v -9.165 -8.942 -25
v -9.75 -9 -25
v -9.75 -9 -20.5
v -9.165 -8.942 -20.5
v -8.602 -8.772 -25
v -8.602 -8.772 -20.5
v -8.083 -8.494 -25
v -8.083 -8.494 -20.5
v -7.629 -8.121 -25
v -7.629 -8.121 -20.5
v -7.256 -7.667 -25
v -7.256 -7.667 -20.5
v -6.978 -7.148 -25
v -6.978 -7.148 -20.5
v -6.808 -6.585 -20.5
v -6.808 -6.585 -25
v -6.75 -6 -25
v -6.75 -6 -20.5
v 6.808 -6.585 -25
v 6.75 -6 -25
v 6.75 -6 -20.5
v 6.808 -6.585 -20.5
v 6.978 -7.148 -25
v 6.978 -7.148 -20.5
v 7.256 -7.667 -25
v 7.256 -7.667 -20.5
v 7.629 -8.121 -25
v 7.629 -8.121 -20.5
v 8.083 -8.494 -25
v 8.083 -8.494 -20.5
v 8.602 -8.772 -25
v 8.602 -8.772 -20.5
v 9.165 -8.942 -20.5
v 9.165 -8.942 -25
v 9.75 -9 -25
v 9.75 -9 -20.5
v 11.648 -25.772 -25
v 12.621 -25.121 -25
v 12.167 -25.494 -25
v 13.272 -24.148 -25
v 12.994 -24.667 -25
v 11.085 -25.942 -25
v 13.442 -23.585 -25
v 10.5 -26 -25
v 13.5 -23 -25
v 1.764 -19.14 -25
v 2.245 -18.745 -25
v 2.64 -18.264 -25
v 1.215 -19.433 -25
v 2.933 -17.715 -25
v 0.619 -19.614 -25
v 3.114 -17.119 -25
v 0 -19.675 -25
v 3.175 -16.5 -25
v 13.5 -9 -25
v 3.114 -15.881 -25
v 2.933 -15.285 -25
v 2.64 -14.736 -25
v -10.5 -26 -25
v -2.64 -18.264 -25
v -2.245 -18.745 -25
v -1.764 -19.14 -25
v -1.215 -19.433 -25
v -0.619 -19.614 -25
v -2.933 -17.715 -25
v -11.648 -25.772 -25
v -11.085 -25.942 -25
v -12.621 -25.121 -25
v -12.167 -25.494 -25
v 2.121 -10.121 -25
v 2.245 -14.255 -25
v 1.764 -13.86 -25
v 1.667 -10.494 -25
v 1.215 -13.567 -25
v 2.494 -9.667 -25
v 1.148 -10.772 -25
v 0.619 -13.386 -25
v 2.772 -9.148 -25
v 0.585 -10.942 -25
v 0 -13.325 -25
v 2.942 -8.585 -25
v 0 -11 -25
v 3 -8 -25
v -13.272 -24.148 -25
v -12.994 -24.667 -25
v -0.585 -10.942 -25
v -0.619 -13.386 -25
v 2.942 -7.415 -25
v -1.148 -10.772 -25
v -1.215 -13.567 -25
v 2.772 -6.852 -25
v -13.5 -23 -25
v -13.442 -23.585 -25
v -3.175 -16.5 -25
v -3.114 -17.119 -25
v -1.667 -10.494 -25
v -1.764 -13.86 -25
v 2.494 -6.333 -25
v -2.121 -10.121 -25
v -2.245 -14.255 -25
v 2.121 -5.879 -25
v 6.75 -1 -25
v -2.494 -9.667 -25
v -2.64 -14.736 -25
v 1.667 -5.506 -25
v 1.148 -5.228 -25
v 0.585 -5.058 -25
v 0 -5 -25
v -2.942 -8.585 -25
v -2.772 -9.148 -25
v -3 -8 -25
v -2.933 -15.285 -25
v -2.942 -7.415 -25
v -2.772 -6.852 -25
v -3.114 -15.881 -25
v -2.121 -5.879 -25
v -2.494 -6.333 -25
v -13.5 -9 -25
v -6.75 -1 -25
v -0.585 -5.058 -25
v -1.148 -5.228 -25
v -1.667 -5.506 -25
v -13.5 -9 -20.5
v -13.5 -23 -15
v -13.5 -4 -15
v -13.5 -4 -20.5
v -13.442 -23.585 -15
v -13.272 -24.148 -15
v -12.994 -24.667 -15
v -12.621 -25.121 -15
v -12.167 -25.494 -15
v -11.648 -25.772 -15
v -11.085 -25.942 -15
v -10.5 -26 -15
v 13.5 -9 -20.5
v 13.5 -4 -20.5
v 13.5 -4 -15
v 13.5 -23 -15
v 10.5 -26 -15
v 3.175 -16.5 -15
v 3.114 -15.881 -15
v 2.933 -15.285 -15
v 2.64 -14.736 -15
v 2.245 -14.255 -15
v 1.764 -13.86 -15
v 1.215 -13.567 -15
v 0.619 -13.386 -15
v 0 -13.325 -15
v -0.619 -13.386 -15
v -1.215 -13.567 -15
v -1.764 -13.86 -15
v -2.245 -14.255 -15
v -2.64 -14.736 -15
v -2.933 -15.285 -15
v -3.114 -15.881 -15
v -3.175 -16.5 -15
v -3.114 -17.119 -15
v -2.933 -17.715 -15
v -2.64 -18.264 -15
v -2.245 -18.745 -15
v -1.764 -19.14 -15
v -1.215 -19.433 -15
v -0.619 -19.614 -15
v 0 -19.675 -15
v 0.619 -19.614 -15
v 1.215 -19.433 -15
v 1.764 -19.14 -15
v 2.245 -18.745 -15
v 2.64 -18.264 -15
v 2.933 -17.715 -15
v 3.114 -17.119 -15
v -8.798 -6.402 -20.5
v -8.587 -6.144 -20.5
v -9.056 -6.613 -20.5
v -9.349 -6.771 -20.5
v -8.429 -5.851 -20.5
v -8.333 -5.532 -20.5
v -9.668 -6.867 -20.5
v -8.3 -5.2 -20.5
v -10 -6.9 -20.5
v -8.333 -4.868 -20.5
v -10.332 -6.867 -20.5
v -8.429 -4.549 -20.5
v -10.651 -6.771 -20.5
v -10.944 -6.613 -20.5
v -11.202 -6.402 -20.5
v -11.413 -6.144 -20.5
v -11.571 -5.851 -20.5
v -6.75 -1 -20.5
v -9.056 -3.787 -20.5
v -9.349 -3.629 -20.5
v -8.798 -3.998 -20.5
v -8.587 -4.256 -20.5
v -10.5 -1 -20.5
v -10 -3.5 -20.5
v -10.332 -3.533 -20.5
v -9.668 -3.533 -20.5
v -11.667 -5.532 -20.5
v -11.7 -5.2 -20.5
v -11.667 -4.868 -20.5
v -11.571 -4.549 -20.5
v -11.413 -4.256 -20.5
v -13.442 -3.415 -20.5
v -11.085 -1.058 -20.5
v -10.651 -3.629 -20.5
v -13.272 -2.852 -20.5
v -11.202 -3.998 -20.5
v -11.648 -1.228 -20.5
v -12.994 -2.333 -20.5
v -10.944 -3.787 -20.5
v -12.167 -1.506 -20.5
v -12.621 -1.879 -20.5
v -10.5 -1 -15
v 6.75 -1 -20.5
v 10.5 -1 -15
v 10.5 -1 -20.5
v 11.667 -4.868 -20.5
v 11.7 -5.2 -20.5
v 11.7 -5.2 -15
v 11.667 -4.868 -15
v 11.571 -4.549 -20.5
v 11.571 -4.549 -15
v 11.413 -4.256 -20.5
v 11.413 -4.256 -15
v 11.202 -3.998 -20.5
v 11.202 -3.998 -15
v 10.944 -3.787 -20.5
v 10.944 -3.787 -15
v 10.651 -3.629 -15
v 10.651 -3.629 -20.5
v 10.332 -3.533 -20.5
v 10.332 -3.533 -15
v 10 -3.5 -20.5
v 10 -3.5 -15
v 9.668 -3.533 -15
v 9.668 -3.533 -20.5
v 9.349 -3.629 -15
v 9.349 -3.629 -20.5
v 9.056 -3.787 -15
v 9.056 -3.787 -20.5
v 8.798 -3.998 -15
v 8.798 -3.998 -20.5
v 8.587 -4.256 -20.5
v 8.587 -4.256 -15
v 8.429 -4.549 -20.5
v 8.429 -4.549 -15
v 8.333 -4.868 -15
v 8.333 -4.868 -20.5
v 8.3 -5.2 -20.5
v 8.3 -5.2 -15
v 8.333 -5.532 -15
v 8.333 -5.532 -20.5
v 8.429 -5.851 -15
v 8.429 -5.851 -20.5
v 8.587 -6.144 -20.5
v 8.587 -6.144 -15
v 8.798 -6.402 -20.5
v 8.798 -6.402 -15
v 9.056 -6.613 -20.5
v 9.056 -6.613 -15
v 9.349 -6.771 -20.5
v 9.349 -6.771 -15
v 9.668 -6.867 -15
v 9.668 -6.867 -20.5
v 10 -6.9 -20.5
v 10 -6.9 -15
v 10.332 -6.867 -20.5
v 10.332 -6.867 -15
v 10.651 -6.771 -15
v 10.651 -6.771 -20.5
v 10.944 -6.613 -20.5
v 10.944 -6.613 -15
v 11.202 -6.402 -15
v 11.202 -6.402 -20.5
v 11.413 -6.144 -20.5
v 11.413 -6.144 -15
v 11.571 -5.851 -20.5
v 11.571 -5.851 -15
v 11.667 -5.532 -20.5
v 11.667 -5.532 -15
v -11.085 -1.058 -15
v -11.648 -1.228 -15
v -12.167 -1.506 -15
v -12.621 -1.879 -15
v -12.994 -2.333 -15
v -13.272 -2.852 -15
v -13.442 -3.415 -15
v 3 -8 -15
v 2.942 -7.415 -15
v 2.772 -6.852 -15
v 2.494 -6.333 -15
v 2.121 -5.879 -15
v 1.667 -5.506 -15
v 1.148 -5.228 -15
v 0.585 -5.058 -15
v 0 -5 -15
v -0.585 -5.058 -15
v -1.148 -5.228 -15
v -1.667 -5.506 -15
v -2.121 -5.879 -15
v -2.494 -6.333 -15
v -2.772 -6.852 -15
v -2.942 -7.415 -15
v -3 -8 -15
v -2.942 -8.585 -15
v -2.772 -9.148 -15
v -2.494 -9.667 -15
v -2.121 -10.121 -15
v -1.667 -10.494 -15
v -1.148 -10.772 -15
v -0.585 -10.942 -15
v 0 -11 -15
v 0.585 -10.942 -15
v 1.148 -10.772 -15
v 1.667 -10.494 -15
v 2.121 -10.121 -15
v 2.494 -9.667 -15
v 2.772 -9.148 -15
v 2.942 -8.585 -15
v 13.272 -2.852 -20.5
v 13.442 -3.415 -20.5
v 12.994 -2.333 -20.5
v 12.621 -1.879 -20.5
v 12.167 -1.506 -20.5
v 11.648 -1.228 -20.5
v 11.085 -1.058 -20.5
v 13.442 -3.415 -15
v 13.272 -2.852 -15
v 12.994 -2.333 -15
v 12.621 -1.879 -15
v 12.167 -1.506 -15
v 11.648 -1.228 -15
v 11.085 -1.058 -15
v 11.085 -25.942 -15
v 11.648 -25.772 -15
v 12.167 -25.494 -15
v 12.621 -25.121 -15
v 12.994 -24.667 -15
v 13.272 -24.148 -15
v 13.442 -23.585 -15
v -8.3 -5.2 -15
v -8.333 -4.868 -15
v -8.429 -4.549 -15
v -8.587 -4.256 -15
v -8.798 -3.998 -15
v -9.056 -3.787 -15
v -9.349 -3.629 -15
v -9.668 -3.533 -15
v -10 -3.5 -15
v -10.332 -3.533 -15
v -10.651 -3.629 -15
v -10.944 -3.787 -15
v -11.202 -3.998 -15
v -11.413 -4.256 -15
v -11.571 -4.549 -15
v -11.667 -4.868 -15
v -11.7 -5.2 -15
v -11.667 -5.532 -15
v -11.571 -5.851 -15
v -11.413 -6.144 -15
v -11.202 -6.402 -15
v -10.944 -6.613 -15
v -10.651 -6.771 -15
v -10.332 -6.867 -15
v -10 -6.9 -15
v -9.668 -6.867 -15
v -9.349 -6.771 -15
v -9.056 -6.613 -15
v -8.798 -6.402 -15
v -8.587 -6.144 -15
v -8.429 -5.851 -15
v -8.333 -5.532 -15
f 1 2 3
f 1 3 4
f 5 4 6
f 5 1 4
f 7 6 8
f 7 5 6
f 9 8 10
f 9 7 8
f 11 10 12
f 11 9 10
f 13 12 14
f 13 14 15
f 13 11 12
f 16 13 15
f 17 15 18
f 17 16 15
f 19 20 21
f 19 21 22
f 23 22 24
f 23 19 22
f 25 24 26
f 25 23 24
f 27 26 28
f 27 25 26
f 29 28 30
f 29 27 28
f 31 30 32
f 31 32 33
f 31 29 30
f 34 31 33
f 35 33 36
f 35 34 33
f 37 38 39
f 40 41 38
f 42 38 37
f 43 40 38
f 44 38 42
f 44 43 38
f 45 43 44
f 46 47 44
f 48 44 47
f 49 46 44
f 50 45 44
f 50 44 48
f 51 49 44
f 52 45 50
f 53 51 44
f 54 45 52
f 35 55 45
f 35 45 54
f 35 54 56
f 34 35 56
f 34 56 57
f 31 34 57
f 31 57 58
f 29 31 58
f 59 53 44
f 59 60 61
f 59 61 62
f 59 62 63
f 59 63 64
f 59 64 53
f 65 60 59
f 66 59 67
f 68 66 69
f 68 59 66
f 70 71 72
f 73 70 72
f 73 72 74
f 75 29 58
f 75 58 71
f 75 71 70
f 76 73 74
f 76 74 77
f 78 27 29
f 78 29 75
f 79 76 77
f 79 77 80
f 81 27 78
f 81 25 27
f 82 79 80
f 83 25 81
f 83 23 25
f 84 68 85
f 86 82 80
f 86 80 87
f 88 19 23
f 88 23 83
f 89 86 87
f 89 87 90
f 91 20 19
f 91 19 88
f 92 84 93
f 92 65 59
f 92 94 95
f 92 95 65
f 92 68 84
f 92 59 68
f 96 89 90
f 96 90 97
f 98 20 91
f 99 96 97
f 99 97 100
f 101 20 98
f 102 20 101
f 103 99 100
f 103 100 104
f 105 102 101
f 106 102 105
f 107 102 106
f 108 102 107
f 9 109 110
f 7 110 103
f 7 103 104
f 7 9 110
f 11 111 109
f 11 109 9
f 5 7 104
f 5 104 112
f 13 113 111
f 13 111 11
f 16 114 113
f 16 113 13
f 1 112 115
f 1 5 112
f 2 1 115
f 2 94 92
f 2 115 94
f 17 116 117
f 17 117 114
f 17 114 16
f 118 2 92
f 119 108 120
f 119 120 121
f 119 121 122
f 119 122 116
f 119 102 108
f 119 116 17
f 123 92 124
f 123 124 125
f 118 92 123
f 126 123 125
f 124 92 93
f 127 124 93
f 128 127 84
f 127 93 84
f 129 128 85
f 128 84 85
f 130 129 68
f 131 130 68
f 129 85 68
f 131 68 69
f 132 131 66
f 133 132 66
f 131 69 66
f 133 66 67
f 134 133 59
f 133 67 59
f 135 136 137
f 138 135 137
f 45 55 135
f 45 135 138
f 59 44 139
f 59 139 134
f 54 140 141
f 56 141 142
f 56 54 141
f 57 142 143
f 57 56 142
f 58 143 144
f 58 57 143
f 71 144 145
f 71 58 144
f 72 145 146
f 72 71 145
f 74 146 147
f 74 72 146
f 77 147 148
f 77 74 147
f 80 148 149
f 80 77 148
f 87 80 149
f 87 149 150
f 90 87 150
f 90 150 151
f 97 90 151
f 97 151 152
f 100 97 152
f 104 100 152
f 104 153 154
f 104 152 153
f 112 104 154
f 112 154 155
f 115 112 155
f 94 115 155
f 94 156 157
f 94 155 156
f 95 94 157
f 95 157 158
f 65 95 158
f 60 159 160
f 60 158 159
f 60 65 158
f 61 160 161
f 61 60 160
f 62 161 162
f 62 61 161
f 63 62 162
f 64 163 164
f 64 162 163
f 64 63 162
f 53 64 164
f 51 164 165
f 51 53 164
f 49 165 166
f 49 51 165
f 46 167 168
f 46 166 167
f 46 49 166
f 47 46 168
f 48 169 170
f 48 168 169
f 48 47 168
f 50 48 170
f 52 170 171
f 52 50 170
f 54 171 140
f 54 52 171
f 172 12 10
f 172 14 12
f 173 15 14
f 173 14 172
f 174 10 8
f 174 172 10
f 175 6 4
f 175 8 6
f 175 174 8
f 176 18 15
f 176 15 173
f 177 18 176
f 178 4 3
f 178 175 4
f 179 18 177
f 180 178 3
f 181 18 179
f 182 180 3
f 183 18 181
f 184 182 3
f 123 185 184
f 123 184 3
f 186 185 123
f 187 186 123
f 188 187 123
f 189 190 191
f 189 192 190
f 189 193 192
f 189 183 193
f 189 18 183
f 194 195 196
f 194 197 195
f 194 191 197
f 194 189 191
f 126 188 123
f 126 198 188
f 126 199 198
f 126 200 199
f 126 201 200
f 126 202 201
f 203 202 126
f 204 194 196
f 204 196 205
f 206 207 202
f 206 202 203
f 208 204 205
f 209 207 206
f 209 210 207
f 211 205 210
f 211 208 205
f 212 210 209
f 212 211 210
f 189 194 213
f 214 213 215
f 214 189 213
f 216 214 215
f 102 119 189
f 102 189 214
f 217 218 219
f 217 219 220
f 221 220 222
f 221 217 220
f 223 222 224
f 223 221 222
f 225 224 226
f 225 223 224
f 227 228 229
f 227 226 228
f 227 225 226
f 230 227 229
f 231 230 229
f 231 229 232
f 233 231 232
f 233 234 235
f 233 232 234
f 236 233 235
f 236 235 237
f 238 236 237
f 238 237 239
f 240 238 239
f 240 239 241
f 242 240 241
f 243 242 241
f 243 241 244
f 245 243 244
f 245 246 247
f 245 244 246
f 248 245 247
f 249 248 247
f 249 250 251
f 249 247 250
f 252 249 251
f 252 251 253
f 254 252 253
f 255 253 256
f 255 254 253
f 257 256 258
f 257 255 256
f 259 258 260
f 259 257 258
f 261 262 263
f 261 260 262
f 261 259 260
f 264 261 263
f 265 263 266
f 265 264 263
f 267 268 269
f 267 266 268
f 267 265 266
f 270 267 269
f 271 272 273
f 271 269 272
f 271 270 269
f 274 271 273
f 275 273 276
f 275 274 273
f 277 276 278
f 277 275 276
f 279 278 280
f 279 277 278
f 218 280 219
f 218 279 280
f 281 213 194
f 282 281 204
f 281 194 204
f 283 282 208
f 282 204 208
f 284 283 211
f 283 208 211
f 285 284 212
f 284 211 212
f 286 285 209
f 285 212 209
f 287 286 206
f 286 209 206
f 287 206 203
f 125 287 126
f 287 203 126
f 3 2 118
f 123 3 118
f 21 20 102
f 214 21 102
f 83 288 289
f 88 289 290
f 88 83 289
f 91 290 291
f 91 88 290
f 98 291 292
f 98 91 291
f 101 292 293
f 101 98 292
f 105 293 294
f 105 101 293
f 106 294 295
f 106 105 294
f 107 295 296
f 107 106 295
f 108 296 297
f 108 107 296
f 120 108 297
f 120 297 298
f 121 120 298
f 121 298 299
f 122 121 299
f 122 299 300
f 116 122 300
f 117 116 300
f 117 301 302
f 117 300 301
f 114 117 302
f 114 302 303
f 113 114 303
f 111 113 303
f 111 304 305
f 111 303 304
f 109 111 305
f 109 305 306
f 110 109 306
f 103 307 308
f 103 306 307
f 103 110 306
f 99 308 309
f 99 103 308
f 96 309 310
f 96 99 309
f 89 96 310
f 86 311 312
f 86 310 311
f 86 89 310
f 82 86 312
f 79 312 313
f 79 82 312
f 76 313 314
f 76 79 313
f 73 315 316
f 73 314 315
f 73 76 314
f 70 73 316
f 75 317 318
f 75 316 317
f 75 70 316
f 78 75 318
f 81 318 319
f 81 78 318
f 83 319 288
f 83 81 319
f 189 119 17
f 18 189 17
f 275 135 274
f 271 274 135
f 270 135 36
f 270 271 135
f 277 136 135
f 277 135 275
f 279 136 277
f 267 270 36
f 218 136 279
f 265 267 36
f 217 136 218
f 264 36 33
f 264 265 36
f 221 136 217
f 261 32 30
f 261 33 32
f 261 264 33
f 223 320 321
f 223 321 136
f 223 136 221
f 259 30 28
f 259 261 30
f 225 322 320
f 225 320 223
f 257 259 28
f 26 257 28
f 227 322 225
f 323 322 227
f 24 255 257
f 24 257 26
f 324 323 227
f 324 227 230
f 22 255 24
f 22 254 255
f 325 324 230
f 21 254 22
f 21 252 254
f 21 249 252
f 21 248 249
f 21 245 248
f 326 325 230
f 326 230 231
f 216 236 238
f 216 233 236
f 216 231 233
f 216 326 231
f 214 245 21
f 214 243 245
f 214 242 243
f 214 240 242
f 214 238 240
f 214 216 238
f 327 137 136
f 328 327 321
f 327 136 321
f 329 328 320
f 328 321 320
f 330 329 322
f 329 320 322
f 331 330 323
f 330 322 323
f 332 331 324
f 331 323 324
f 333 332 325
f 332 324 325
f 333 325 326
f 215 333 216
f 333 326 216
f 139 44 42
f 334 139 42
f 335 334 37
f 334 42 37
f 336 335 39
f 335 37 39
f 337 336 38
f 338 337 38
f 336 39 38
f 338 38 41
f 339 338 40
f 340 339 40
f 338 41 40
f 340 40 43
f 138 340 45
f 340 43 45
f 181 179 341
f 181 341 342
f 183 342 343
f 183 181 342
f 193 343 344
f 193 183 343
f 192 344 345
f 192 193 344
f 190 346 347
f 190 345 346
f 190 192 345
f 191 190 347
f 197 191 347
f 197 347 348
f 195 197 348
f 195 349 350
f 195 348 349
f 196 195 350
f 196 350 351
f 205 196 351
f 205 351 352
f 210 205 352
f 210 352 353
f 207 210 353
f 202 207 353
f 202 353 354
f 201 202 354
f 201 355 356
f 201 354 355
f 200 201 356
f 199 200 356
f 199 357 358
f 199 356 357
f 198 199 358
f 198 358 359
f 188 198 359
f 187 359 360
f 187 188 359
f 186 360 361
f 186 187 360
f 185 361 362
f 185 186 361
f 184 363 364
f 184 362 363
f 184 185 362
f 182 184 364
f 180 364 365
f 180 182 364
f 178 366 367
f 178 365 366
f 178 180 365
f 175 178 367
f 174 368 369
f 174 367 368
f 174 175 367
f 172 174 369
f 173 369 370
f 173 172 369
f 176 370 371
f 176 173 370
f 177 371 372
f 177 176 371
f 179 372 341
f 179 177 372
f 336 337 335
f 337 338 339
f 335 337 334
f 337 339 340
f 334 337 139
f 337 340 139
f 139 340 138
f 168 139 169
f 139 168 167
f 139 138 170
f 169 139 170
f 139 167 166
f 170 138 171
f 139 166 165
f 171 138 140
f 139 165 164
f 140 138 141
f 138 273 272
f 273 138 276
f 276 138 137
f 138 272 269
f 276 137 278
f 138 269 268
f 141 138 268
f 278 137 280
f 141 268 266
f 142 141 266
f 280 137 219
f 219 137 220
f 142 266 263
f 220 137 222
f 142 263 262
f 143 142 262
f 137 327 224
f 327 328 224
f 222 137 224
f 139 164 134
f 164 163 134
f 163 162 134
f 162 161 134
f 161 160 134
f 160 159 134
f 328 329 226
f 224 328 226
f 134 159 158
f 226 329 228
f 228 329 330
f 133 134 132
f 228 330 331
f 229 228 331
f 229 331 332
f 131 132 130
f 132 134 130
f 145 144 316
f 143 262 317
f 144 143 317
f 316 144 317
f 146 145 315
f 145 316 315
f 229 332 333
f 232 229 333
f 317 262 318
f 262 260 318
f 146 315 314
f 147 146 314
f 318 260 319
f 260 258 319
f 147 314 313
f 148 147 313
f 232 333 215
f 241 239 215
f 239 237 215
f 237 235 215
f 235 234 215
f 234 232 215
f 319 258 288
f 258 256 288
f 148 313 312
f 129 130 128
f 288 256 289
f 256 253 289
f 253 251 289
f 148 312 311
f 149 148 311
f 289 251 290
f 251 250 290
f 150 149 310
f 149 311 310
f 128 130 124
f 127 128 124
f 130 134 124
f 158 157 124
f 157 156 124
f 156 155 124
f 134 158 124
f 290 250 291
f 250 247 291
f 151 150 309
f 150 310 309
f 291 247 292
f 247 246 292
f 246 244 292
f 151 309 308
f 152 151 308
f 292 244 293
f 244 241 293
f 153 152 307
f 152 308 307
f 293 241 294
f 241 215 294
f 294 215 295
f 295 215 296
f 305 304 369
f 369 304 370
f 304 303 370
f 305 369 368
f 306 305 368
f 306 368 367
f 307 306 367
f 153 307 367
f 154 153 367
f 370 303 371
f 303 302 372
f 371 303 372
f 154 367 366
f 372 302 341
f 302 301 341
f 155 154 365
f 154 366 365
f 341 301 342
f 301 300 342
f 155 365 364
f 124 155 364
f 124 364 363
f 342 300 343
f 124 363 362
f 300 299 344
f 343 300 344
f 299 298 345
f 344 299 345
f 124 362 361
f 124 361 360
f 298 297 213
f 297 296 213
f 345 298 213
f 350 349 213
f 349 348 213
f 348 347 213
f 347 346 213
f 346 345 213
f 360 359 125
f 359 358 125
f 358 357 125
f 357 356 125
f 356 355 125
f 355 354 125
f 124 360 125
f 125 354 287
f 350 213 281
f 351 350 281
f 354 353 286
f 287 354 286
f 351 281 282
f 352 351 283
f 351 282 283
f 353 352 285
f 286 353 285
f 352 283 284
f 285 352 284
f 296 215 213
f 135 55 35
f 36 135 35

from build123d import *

# Parameters (mm, degrees)
PAD005_DEPTH    = 10
SKETCH010_R     = 3
SKETCH010_R_2   = 3.175
POCKET005_DEPTH = 10.001
SKETCH011_R     = 1.7
POCKET006_DEPTH = 10.001
POCKET004_DEPTH = 4.5


with BuildPart() as part:
    # Sketch012 → Pad005 (new body)
    with BuildSketch(Plane.XY):
        with BuildLine():
            Line((-10.5, 0), (10.5, 0))
            ThreePointArc((13.5, -3), (12.62132, -0.87868), (10.5, 0))
            Line((13.5, -3), (13.5, -22))
            ThreePointArc((10.5, -25), (12.62132, -24.12132), (13.5, -22))
            Line((10.5, -25), (-10.5, -25))
            ThreePointArc((-13.5, -22), (-12.62132, -24.12132), (-10.5, -25))
            Line((-13.5, -22), (-13.5, -3))
            ThreePointArc((-10.5, 0), (-12.62132, -0.87868), (-13.5, -3))
        make_face()
    extrude(amount=PAD005_DEPTH)

    # Sketch010 → Pocket005 (cut, through all)
    with BuildSketch(Plane.XY):
        with Locations((0, -7)):
            Circle(SKETCH010_R)
        with Locations((0, -15.5)):
            Circle(SKETCH010_R_2)
    extrude(amount=POCKET005_DEPTH, mode=Mode.SUBTRACT)

    # Sketch011 → Pocket006 (cut, through all)
    with BuildSketch(Plane.XY):
        with Locations((-10, -4.2)):
            Circle(SKETCH011_R)
        with Locations((10, -4.2)):
            Circle(SKETCH011_R)
    extrude(amount=POCKET006_DEPTH, mode=Mode.SUBTRACT)

    # Sketch013 → Pocket004 (cut)
    with BuildSketch(Plane.XY):
        with BuildLine():
            Line((-6.75, 5), (-6.75, -5))
            ThreePointArc((-9.75, -8), (-7.62868, -7.12132), (-6.75, -5))
            Line((-9.75, -8), (-20, -8))
            Line((-20, -8), (-20, 10))
            Line((-20, 10), (20, 10))
            Line((20, 10), (20, -8))
            Line((20, -8), (9.75, -8))
            ThreePointArc((6.75, -5), (7.62868, -7.12132), (9.75, -8))
            Line((6.75, -5), (6.75, 5))
            Line((6.75, 5), (-6.75, 5))
        make_face()
    extrude(amount=POCKET004_DEPTH, mode=Mode.SUBTRACT)


with BuildPart() as part_1:
    # Body004 placement: moved
    add(part.part.moved(Location((0, -1, -25))))


solid = part_1.part
